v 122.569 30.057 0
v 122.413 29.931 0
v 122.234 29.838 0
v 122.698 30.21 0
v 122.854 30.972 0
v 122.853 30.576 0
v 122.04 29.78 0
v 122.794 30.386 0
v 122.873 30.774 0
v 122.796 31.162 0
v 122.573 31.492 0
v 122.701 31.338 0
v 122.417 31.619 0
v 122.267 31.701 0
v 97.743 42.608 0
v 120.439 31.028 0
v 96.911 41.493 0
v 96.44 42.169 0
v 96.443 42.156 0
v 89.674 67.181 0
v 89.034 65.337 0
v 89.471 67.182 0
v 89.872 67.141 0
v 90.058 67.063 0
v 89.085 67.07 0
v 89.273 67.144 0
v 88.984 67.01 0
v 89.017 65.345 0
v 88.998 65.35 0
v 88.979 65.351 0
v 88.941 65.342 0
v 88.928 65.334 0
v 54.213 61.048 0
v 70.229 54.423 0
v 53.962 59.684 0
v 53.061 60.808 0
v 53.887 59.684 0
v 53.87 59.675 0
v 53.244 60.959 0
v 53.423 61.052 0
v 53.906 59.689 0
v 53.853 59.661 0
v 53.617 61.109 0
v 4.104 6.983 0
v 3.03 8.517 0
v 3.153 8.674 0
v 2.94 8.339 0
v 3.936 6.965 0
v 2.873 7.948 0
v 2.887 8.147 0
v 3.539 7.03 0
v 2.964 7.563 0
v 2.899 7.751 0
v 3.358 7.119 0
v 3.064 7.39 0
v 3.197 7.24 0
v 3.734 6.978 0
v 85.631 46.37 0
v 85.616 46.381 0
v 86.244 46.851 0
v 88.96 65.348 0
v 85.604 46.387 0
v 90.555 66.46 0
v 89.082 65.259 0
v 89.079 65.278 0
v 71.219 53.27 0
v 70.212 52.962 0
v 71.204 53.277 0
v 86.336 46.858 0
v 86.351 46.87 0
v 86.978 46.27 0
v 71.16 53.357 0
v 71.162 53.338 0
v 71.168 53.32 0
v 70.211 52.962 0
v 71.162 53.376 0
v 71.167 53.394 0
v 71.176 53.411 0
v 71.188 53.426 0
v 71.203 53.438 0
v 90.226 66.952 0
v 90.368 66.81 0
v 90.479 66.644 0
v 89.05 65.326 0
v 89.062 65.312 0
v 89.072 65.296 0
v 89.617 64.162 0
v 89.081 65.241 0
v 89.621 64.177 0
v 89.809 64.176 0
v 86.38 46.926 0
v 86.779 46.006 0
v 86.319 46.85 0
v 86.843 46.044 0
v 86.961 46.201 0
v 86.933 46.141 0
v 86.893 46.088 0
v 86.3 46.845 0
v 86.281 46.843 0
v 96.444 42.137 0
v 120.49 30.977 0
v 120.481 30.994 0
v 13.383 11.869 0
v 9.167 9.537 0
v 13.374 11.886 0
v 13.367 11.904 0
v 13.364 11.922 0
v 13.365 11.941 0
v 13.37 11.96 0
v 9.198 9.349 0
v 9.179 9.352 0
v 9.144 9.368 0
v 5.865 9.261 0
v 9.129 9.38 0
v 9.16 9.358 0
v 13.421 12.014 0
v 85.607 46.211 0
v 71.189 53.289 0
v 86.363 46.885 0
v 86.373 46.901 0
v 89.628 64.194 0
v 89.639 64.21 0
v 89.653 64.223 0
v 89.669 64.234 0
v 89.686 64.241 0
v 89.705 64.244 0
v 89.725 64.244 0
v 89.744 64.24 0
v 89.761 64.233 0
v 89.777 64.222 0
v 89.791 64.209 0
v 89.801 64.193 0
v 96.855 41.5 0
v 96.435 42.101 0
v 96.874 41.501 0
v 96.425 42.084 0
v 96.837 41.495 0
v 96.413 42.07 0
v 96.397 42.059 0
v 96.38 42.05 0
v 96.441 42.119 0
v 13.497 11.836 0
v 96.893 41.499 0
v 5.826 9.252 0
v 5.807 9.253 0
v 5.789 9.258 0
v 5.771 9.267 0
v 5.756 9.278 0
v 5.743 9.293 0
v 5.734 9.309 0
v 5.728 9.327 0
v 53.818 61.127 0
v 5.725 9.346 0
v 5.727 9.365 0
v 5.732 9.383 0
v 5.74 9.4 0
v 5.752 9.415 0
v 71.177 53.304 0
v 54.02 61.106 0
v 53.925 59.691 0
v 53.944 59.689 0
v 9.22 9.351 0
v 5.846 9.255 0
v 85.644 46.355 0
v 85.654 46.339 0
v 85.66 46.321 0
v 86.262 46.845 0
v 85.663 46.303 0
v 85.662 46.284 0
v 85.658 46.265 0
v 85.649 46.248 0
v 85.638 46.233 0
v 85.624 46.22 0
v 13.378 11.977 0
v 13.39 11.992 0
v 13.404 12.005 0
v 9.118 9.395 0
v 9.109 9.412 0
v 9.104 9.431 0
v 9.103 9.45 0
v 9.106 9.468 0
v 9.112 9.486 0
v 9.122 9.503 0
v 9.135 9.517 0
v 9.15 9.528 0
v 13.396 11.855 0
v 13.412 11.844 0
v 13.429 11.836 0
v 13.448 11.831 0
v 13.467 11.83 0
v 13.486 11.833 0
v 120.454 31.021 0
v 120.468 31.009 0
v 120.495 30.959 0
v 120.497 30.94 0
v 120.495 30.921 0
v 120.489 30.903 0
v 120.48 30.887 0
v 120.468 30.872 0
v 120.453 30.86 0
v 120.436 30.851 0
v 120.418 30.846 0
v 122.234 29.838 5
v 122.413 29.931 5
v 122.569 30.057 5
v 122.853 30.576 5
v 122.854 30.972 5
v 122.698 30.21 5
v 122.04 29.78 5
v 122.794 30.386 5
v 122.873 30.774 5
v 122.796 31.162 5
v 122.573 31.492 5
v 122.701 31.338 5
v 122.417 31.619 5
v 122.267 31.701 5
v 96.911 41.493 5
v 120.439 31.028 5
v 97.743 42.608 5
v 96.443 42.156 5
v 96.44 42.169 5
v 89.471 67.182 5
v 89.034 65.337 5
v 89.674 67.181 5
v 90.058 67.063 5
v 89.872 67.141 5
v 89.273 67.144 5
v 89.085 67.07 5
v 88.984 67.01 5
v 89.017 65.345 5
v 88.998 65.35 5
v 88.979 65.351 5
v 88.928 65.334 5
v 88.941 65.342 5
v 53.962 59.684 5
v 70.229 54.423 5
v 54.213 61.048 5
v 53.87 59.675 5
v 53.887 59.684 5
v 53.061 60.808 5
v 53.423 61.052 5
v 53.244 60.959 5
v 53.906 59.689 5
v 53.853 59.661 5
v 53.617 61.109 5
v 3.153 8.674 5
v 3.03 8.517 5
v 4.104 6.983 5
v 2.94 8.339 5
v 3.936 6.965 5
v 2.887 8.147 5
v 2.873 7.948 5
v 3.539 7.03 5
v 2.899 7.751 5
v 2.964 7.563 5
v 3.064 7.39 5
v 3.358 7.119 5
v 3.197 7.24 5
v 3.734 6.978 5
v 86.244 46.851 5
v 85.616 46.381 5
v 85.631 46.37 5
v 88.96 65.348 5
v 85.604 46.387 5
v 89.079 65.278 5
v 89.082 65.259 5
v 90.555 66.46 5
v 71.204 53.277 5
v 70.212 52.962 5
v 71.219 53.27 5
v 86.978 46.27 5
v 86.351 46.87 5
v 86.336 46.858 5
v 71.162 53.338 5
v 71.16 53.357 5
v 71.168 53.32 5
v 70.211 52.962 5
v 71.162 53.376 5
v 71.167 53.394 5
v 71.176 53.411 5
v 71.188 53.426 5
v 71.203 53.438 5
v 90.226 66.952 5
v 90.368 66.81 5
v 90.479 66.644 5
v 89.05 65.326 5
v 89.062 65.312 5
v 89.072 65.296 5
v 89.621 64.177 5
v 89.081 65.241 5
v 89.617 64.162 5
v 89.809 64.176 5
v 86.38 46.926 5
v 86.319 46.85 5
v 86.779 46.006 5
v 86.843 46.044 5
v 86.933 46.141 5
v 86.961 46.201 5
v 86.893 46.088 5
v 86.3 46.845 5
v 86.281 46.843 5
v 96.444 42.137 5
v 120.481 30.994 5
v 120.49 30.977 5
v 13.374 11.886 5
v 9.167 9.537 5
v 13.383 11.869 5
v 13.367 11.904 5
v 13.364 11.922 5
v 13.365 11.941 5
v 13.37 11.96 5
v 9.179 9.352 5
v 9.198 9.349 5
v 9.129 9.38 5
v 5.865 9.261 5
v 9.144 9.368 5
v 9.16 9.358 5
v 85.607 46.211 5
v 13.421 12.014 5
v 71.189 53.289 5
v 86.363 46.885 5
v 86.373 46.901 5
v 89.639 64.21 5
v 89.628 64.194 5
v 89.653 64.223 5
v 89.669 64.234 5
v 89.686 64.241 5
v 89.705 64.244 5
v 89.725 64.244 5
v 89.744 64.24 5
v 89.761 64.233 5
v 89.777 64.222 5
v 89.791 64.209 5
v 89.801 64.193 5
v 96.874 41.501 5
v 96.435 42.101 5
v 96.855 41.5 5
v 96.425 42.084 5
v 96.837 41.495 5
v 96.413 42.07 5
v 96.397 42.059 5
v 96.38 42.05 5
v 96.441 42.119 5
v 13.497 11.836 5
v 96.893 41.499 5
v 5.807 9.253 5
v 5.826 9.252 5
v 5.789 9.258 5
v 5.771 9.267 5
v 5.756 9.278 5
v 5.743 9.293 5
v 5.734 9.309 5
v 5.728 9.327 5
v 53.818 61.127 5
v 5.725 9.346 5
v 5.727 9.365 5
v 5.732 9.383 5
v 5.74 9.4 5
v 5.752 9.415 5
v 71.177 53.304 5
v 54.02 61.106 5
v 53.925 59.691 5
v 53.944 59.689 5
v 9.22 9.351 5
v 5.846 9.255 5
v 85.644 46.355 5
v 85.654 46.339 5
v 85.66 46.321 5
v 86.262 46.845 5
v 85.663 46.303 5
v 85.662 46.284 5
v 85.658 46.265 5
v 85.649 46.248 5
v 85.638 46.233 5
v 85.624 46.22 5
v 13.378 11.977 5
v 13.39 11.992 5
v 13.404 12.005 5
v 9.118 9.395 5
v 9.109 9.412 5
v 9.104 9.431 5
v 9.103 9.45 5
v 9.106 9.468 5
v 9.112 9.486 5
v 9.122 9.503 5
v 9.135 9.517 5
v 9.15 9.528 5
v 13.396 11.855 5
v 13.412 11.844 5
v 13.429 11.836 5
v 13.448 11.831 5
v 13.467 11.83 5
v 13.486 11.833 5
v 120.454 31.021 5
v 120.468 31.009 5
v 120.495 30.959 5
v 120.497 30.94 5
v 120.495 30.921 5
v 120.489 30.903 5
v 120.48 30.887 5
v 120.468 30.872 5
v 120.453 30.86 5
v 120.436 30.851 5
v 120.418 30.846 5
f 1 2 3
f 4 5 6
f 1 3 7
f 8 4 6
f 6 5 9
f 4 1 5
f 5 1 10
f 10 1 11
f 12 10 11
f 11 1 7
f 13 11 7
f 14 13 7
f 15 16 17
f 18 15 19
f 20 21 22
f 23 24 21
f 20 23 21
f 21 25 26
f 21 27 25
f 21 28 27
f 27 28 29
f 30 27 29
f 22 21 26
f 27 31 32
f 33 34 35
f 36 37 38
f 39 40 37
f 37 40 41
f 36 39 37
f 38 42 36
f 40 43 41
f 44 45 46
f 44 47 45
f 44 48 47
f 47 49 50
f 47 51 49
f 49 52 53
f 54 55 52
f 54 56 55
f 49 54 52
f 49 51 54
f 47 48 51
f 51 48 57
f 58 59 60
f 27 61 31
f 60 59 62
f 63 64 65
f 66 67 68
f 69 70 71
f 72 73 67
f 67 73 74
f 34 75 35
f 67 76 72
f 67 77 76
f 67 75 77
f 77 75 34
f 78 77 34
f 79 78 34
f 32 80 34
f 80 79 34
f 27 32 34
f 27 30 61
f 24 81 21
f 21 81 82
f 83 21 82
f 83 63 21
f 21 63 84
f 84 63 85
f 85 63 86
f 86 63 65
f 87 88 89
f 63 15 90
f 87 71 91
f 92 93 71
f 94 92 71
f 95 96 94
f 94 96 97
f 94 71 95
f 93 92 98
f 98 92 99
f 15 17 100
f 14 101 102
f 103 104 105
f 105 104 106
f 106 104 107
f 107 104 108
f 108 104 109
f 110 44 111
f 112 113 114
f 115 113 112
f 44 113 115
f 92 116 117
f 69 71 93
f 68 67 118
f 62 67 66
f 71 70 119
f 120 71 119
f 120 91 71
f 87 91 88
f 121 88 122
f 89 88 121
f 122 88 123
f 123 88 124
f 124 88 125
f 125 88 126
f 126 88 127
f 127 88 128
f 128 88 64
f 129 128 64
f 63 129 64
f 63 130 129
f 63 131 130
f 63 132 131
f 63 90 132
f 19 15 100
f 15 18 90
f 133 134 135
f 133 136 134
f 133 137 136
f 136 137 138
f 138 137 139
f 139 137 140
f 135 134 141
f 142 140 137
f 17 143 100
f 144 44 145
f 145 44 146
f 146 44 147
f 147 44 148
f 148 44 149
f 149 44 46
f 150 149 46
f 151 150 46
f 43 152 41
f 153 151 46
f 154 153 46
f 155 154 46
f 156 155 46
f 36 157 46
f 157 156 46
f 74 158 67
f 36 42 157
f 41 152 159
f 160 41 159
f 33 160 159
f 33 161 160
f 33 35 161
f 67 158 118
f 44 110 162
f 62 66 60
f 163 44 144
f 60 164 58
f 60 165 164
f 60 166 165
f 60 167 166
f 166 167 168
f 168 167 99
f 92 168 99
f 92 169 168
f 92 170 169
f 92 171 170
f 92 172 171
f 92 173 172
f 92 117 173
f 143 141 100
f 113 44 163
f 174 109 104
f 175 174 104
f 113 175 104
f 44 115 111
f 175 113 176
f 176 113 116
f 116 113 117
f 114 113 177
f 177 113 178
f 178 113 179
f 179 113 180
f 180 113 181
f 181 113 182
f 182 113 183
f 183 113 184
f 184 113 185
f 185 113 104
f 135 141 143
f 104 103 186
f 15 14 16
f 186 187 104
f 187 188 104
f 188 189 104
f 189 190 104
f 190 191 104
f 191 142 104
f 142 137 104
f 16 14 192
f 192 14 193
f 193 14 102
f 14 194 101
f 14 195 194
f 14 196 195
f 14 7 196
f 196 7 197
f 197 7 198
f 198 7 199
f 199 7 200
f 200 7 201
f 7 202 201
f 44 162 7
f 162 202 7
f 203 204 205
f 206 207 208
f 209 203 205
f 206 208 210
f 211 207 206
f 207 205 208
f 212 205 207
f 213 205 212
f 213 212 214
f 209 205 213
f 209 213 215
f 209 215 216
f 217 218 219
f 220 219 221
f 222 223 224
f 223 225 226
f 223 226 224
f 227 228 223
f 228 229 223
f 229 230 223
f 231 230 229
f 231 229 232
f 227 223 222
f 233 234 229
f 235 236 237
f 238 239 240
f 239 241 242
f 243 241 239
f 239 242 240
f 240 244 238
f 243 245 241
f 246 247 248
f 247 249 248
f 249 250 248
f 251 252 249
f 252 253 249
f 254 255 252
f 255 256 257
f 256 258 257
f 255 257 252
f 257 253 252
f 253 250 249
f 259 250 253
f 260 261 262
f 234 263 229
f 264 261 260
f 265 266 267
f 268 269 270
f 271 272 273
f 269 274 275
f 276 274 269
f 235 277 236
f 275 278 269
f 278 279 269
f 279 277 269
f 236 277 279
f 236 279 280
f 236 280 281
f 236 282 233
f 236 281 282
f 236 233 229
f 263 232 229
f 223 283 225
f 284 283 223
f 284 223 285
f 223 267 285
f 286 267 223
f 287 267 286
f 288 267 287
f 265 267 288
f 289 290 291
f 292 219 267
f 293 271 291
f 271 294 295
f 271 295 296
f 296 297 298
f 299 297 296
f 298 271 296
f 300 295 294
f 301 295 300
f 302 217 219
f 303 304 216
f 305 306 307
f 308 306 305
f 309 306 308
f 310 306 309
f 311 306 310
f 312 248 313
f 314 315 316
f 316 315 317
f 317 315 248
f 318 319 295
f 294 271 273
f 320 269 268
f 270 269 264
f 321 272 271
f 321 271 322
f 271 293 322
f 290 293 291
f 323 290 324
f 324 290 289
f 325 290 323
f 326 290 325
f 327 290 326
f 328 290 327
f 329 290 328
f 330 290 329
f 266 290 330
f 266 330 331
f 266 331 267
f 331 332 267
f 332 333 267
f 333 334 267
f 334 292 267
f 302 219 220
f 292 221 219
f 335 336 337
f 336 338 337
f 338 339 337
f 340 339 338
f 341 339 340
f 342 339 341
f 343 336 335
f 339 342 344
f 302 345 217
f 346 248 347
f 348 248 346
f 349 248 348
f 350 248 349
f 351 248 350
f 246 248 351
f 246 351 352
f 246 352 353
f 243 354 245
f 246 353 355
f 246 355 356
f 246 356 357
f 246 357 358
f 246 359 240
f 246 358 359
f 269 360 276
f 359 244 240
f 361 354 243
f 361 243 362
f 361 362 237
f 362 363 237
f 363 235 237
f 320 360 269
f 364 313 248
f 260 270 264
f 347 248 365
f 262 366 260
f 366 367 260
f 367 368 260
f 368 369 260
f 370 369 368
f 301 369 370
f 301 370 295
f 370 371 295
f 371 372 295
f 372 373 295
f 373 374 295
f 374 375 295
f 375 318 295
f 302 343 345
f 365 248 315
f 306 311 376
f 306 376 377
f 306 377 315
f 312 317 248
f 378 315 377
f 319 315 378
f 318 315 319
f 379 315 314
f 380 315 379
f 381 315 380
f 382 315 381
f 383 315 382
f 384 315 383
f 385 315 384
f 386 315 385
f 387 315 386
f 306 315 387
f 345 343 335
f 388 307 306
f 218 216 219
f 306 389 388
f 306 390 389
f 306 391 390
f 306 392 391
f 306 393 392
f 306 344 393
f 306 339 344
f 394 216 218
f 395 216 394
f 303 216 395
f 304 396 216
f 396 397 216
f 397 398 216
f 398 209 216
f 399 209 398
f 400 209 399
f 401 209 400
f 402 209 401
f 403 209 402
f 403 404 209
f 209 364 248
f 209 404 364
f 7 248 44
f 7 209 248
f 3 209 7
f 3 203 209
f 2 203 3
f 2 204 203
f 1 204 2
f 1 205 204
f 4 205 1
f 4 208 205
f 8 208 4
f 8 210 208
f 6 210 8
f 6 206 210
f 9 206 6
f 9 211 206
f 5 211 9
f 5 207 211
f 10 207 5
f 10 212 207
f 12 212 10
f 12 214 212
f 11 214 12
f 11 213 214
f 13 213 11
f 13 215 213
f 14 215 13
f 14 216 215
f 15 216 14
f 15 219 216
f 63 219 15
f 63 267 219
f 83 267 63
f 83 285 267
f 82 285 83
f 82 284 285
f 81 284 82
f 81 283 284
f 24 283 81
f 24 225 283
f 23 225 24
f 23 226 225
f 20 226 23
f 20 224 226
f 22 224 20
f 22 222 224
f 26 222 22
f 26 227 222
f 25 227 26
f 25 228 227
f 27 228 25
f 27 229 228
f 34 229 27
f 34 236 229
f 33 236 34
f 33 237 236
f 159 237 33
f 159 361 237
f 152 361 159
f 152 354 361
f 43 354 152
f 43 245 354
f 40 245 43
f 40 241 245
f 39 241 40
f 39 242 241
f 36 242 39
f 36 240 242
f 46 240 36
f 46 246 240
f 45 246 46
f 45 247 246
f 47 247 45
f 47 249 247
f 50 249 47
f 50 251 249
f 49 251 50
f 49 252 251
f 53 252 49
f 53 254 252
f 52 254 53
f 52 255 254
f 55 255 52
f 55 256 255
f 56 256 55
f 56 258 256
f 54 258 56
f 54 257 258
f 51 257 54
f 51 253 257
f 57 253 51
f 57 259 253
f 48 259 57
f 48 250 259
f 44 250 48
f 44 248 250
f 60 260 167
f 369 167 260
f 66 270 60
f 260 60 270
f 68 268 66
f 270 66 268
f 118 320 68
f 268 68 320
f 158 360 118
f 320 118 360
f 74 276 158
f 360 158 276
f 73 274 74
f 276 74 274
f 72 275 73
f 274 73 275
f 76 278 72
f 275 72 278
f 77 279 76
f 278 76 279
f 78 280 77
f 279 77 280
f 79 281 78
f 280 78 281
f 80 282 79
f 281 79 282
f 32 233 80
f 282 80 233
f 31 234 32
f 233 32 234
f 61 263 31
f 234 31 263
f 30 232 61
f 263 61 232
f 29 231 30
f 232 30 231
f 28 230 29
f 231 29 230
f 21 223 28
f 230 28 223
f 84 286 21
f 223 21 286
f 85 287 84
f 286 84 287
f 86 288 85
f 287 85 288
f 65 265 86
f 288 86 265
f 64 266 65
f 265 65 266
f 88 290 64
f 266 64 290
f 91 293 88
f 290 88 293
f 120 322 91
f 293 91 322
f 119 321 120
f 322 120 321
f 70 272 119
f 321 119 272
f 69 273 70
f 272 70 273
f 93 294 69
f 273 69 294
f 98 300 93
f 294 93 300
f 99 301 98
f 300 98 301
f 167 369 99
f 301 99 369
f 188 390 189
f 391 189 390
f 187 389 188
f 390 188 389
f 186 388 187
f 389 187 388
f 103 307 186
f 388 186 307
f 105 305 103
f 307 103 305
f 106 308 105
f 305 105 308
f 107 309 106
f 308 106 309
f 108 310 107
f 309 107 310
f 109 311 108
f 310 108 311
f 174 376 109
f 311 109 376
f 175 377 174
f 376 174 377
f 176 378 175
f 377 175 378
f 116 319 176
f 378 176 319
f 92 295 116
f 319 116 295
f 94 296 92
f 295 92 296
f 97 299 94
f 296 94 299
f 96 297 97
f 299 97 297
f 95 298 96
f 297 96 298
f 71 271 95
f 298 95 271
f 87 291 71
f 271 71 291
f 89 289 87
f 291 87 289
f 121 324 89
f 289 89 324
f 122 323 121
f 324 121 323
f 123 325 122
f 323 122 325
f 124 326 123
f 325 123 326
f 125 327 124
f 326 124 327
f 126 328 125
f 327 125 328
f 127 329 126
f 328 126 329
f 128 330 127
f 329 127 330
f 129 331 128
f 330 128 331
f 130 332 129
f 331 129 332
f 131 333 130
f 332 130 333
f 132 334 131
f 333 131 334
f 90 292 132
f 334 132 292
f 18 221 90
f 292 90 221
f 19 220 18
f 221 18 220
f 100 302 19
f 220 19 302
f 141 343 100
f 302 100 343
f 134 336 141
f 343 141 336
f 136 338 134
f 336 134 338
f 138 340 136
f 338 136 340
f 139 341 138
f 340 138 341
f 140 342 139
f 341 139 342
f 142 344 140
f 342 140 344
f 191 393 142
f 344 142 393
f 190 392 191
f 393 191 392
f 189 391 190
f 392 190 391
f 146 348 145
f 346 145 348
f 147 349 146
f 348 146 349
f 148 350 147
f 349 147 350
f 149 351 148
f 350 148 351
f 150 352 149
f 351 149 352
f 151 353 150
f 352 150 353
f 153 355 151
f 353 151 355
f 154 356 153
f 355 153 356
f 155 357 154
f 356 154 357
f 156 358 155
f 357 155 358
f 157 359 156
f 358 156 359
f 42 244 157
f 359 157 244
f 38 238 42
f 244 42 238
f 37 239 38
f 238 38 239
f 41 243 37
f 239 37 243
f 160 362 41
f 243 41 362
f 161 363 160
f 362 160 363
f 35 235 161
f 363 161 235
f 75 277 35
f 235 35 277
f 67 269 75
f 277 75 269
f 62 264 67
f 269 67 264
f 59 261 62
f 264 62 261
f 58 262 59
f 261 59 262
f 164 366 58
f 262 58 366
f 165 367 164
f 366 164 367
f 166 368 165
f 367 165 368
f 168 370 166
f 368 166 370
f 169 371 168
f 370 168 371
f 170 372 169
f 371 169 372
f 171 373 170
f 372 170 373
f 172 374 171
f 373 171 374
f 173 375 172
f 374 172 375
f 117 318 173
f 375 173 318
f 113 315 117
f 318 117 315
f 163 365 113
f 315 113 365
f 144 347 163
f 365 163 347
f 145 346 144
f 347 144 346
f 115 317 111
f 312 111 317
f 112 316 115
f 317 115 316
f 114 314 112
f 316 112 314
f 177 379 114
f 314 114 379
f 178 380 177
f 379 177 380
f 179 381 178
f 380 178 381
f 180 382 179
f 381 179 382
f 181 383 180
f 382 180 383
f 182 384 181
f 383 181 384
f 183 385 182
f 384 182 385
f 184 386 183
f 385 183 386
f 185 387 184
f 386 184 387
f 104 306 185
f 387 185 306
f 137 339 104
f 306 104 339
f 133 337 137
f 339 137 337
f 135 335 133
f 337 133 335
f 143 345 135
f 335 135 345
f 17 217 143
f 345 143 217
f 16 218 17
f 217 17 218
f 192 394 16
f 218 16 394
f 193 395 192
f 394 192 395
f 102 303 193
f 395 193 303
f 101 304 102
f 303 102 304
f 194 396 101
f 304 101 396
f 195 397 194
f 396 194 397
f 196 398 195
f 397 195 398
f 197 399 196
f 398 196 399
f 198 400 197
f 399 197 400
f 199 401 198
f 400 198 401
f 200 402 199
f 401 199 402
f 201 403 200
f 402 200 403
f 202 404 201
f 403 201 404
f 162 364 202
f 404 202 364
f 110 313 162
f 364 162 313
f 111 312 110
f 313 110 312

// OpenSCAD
/*
 * Customizable Origami - Paperplane - https://www.thingiverse.com/thing:2627080
 * by Dennis Hofmann - https://www.thingiverse.com/mightynozzle/about
 * created 2017-11-05
 * version v1.0
 *
 * Changelog
 * --------------
 * v1.0:
 *      - final design
 * --------------
 * 
 * This work is licensed under the Creative Commons - Attribution - NonCommercial - ShareAlike license.
 * https://creativecommons.org/licenses/by-nc-sa/3.0/
 */


 // Parameter Section //
//-------------------//

// preview[view:north, tilt:top]

// The maximum size of the longest side. The shorter side will be automatically resized in same ratio.
max_size_in_millimeter = 120; //[20:300]

// The height of the model.
model_height_in_millimeter = 5; //[0.2:0.2:100]

// Thickness of the outer outline.
outline_size_in_millimeter = 1.4; //[0.5:0.1:20]

// Thickness of the inner outline.
inline_size_in_millimeter = 0.7; //[0.5:0.1:20]

// Roundiness of the ends of the inner outlines.
inline_edge_radius_in_millimeter = 0.1; //[0.0:0.1:5]

// Flip model
flip_model = "no"; //[yes,no]

/*[hidden]*/
max_size = max_size_in_millimeter;
model_height = model_height_in_millimeter;
$fn=32;

// Outer Points
A1 = [64, 133];
A2 = [1997, 513];
A3 = [1588, 698];
A4 = [1468, 1103];
A5 = [1153, 888];
A6 = [882, 1002];

outline = [A1, A2, A3, A4, A5, A6];

// Inner Points
B1 = [1420, 772];

// Polygons
C1 = [A1, A6, A5, B1];
C2 = [A5, B1, A4];
C3 = [A4, A3, A1, B1];
C4 = [A3, A2, A1];

cut_polygons = [C1, C2, C3, C4];

min_x = A1[0];
min_y = A1[1];
max_x = A2[0];
max_y = A4[1];

x_size = max_x - min_x;
y_size = max_y - min_y;

x_factor = max_size / x_size;
y_factor = max_size / y_size;

inline_size = x_size > y_size ? inline_size_in_millimeter / x_factor / 2: inline_size_in_millimeter / y_factor / 2;
inline_edge_radius = x_size > y_size ? inline_edge_radius_in_millimeter / x_factor: inline_edge_radius_in_millimeter / y_factor;
outline_size = x_size > y_size ? outline_size_in_millimeter / x_factor - inline_size: outline_size_in_millimeter / y_factor - inline_size;


 // Program Section //
//-----------------//

if(x_size > y_size) {
    resize(newsize=[max_size, x_factor * y_size, model_height]){
        if(flip_model == "yes") {
            mirror([0,1,0]) {
                rotate([180,180,0]) {    
                    create(outline, cut_polygons);
                }
            }
        } else {
            create(outline, cut_polygons);
        }
    }
} else {
    resize(newsize=[y_factor * x_size, max_size, model_height]){
        if(flip_model == "yes") {
            mirror([0,1,0]) {
                rotate([180,180,0]) {    
                    create(outline, cut_polygons);
                }
            }
        } else {
            create(outline, cut_polygons);
        }
    }
}


 // Module Section //
//----------------//

module create() {
    linear_extrude(height=1) {
        difference() {
            offset(r = -0) {
                offset(r = +outline_size) {
                    polygon(points = outline, convexity = 10);
                }
            }
            
            for(cut_polygon = [0:len(cut_polygons)]) {
                offset(r = +inline_edge_radius) {
                    offset(r = -inline_size - inline_edge_radius) {
                        polygon(points = cut_polygons[cut_polygon], convexity = 10);
                    }
                }
            }
        }
    }
}
